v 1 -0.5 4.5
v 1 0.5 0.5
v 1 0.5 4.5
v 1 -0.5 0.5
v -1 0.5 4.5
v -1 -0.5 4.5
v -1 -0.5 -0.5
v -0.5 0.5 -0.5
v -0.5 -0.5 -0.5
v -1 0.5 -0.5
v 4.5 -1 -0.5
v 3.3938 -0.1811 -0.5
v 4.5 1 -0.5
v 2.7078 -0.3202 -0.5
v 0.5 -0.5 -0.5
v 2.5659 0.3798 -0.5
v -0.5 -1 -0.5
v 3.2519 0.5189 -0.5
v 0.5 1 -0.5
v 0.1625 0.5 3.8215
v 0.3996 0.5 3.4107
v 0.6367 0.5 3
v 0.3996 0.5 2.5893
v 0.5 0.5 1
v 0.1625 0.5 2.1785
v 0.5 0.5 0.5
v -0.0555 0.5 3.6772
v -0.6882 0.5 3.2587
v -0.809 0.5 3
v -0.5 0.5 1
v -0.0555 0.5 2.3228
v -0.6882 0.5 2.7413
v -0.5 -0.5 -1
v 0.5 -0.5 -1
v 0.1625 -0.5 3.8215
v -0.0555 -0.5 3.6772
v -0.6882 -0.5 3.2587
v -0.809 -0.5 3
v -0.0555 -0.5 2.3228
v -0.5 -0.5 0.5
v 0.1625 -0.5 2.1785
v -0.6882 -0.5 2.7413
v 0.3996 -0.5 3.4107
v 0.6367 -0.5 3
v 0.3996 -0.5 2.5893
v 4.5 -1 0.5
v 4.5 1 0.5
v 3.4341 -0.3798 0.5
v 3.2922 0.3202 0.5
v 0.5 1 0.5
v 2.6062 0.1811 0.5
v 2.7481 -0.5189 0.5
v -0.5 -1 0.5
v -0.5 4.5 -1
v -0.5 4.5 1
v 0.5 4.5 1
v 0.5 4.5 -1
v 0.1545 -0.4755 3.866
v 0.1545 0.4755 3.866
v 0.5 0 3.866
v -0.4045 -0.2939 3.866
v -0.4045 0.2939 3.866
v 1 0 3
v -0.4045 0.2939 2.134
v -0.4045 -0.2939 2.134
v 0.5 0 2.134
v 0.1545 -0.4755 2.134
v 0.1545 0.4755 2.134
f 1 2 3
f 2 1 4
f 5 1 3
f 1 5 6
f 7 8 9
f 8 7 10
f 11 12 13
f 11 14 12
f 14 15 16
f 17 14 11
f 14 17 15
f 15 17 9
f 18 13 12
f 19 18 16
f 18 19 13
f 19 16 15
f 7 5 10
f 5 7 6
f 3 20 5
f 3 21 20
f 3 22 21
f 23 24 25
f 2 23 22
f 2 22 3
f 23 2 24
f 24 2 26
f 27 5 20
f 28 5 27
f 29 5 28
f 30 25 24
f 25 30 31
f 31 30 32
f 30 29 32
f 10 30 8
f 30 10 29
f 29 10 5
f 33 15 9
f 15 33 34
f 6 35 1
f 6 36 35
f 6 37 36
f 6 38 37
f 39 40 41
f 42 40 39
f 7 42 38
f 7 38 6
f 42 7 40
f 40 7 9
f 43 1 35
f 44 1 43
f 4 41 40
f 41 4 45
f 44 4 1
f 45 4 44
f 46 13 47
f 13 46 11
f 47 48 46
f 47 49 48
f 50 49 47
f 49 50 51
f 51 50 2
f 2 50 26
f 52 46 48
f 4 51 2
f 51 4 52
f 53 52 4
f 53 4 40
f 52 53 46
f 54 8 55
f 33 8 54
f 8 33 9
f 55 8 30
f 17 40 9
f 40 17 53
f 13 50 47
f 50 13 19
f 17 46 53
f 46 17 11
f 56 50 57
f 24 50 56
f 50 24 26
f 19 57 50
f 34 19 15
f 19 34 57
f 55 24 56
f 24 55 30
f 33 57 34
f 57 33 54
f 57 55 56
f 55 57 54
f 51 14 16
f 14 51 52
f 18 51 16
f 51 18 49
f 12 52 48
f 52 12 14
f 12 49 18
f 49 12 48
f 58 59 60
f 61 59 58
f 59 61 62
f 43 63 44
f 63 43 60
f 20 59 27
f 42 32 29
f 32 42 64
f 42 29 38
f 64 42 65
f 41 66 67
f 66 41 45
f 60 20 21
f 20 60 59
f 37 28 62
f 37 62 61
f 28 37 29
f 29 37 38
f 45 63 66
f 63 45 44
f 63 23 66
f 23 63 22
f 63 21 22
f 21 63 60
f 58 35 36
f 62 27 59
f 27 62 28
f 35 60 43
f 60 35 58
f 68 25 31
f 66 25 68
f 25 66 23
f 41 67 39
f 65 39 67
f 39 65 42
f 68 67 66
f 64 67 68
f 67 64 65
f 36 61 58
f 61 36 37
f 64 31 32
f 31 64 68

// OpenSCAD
module screw() {
    rotate(a=[11.459155902616464, 0.0, 11.459155902616464]) {
        cube(size=[0.7, 0.7, 5.0], center=true);
    };
};

module sprocket() {
    sphere(r=1.0);
};

difference() {
    union() {
        translate([0.0, 0.0, 2.0]) {
            cube(size=[2.0, 1.0, 5.0], center=true);
        };
        translate([2.0, 0.0, 0.0]) {
            cube(size=[5.0, 2.0, 1.0], center=true);
        };
        translate([0.0, 2.0, 0.0]) {
            cube(size=[1.0, 5.0, 2.0], center=true);
        };
    };
    translate([3.0, 0.0, 0.0]) {
        screw() {};
    };
    translate([0.0, 0.0, 3.0]) {
        sprocket() {};
    };
};
